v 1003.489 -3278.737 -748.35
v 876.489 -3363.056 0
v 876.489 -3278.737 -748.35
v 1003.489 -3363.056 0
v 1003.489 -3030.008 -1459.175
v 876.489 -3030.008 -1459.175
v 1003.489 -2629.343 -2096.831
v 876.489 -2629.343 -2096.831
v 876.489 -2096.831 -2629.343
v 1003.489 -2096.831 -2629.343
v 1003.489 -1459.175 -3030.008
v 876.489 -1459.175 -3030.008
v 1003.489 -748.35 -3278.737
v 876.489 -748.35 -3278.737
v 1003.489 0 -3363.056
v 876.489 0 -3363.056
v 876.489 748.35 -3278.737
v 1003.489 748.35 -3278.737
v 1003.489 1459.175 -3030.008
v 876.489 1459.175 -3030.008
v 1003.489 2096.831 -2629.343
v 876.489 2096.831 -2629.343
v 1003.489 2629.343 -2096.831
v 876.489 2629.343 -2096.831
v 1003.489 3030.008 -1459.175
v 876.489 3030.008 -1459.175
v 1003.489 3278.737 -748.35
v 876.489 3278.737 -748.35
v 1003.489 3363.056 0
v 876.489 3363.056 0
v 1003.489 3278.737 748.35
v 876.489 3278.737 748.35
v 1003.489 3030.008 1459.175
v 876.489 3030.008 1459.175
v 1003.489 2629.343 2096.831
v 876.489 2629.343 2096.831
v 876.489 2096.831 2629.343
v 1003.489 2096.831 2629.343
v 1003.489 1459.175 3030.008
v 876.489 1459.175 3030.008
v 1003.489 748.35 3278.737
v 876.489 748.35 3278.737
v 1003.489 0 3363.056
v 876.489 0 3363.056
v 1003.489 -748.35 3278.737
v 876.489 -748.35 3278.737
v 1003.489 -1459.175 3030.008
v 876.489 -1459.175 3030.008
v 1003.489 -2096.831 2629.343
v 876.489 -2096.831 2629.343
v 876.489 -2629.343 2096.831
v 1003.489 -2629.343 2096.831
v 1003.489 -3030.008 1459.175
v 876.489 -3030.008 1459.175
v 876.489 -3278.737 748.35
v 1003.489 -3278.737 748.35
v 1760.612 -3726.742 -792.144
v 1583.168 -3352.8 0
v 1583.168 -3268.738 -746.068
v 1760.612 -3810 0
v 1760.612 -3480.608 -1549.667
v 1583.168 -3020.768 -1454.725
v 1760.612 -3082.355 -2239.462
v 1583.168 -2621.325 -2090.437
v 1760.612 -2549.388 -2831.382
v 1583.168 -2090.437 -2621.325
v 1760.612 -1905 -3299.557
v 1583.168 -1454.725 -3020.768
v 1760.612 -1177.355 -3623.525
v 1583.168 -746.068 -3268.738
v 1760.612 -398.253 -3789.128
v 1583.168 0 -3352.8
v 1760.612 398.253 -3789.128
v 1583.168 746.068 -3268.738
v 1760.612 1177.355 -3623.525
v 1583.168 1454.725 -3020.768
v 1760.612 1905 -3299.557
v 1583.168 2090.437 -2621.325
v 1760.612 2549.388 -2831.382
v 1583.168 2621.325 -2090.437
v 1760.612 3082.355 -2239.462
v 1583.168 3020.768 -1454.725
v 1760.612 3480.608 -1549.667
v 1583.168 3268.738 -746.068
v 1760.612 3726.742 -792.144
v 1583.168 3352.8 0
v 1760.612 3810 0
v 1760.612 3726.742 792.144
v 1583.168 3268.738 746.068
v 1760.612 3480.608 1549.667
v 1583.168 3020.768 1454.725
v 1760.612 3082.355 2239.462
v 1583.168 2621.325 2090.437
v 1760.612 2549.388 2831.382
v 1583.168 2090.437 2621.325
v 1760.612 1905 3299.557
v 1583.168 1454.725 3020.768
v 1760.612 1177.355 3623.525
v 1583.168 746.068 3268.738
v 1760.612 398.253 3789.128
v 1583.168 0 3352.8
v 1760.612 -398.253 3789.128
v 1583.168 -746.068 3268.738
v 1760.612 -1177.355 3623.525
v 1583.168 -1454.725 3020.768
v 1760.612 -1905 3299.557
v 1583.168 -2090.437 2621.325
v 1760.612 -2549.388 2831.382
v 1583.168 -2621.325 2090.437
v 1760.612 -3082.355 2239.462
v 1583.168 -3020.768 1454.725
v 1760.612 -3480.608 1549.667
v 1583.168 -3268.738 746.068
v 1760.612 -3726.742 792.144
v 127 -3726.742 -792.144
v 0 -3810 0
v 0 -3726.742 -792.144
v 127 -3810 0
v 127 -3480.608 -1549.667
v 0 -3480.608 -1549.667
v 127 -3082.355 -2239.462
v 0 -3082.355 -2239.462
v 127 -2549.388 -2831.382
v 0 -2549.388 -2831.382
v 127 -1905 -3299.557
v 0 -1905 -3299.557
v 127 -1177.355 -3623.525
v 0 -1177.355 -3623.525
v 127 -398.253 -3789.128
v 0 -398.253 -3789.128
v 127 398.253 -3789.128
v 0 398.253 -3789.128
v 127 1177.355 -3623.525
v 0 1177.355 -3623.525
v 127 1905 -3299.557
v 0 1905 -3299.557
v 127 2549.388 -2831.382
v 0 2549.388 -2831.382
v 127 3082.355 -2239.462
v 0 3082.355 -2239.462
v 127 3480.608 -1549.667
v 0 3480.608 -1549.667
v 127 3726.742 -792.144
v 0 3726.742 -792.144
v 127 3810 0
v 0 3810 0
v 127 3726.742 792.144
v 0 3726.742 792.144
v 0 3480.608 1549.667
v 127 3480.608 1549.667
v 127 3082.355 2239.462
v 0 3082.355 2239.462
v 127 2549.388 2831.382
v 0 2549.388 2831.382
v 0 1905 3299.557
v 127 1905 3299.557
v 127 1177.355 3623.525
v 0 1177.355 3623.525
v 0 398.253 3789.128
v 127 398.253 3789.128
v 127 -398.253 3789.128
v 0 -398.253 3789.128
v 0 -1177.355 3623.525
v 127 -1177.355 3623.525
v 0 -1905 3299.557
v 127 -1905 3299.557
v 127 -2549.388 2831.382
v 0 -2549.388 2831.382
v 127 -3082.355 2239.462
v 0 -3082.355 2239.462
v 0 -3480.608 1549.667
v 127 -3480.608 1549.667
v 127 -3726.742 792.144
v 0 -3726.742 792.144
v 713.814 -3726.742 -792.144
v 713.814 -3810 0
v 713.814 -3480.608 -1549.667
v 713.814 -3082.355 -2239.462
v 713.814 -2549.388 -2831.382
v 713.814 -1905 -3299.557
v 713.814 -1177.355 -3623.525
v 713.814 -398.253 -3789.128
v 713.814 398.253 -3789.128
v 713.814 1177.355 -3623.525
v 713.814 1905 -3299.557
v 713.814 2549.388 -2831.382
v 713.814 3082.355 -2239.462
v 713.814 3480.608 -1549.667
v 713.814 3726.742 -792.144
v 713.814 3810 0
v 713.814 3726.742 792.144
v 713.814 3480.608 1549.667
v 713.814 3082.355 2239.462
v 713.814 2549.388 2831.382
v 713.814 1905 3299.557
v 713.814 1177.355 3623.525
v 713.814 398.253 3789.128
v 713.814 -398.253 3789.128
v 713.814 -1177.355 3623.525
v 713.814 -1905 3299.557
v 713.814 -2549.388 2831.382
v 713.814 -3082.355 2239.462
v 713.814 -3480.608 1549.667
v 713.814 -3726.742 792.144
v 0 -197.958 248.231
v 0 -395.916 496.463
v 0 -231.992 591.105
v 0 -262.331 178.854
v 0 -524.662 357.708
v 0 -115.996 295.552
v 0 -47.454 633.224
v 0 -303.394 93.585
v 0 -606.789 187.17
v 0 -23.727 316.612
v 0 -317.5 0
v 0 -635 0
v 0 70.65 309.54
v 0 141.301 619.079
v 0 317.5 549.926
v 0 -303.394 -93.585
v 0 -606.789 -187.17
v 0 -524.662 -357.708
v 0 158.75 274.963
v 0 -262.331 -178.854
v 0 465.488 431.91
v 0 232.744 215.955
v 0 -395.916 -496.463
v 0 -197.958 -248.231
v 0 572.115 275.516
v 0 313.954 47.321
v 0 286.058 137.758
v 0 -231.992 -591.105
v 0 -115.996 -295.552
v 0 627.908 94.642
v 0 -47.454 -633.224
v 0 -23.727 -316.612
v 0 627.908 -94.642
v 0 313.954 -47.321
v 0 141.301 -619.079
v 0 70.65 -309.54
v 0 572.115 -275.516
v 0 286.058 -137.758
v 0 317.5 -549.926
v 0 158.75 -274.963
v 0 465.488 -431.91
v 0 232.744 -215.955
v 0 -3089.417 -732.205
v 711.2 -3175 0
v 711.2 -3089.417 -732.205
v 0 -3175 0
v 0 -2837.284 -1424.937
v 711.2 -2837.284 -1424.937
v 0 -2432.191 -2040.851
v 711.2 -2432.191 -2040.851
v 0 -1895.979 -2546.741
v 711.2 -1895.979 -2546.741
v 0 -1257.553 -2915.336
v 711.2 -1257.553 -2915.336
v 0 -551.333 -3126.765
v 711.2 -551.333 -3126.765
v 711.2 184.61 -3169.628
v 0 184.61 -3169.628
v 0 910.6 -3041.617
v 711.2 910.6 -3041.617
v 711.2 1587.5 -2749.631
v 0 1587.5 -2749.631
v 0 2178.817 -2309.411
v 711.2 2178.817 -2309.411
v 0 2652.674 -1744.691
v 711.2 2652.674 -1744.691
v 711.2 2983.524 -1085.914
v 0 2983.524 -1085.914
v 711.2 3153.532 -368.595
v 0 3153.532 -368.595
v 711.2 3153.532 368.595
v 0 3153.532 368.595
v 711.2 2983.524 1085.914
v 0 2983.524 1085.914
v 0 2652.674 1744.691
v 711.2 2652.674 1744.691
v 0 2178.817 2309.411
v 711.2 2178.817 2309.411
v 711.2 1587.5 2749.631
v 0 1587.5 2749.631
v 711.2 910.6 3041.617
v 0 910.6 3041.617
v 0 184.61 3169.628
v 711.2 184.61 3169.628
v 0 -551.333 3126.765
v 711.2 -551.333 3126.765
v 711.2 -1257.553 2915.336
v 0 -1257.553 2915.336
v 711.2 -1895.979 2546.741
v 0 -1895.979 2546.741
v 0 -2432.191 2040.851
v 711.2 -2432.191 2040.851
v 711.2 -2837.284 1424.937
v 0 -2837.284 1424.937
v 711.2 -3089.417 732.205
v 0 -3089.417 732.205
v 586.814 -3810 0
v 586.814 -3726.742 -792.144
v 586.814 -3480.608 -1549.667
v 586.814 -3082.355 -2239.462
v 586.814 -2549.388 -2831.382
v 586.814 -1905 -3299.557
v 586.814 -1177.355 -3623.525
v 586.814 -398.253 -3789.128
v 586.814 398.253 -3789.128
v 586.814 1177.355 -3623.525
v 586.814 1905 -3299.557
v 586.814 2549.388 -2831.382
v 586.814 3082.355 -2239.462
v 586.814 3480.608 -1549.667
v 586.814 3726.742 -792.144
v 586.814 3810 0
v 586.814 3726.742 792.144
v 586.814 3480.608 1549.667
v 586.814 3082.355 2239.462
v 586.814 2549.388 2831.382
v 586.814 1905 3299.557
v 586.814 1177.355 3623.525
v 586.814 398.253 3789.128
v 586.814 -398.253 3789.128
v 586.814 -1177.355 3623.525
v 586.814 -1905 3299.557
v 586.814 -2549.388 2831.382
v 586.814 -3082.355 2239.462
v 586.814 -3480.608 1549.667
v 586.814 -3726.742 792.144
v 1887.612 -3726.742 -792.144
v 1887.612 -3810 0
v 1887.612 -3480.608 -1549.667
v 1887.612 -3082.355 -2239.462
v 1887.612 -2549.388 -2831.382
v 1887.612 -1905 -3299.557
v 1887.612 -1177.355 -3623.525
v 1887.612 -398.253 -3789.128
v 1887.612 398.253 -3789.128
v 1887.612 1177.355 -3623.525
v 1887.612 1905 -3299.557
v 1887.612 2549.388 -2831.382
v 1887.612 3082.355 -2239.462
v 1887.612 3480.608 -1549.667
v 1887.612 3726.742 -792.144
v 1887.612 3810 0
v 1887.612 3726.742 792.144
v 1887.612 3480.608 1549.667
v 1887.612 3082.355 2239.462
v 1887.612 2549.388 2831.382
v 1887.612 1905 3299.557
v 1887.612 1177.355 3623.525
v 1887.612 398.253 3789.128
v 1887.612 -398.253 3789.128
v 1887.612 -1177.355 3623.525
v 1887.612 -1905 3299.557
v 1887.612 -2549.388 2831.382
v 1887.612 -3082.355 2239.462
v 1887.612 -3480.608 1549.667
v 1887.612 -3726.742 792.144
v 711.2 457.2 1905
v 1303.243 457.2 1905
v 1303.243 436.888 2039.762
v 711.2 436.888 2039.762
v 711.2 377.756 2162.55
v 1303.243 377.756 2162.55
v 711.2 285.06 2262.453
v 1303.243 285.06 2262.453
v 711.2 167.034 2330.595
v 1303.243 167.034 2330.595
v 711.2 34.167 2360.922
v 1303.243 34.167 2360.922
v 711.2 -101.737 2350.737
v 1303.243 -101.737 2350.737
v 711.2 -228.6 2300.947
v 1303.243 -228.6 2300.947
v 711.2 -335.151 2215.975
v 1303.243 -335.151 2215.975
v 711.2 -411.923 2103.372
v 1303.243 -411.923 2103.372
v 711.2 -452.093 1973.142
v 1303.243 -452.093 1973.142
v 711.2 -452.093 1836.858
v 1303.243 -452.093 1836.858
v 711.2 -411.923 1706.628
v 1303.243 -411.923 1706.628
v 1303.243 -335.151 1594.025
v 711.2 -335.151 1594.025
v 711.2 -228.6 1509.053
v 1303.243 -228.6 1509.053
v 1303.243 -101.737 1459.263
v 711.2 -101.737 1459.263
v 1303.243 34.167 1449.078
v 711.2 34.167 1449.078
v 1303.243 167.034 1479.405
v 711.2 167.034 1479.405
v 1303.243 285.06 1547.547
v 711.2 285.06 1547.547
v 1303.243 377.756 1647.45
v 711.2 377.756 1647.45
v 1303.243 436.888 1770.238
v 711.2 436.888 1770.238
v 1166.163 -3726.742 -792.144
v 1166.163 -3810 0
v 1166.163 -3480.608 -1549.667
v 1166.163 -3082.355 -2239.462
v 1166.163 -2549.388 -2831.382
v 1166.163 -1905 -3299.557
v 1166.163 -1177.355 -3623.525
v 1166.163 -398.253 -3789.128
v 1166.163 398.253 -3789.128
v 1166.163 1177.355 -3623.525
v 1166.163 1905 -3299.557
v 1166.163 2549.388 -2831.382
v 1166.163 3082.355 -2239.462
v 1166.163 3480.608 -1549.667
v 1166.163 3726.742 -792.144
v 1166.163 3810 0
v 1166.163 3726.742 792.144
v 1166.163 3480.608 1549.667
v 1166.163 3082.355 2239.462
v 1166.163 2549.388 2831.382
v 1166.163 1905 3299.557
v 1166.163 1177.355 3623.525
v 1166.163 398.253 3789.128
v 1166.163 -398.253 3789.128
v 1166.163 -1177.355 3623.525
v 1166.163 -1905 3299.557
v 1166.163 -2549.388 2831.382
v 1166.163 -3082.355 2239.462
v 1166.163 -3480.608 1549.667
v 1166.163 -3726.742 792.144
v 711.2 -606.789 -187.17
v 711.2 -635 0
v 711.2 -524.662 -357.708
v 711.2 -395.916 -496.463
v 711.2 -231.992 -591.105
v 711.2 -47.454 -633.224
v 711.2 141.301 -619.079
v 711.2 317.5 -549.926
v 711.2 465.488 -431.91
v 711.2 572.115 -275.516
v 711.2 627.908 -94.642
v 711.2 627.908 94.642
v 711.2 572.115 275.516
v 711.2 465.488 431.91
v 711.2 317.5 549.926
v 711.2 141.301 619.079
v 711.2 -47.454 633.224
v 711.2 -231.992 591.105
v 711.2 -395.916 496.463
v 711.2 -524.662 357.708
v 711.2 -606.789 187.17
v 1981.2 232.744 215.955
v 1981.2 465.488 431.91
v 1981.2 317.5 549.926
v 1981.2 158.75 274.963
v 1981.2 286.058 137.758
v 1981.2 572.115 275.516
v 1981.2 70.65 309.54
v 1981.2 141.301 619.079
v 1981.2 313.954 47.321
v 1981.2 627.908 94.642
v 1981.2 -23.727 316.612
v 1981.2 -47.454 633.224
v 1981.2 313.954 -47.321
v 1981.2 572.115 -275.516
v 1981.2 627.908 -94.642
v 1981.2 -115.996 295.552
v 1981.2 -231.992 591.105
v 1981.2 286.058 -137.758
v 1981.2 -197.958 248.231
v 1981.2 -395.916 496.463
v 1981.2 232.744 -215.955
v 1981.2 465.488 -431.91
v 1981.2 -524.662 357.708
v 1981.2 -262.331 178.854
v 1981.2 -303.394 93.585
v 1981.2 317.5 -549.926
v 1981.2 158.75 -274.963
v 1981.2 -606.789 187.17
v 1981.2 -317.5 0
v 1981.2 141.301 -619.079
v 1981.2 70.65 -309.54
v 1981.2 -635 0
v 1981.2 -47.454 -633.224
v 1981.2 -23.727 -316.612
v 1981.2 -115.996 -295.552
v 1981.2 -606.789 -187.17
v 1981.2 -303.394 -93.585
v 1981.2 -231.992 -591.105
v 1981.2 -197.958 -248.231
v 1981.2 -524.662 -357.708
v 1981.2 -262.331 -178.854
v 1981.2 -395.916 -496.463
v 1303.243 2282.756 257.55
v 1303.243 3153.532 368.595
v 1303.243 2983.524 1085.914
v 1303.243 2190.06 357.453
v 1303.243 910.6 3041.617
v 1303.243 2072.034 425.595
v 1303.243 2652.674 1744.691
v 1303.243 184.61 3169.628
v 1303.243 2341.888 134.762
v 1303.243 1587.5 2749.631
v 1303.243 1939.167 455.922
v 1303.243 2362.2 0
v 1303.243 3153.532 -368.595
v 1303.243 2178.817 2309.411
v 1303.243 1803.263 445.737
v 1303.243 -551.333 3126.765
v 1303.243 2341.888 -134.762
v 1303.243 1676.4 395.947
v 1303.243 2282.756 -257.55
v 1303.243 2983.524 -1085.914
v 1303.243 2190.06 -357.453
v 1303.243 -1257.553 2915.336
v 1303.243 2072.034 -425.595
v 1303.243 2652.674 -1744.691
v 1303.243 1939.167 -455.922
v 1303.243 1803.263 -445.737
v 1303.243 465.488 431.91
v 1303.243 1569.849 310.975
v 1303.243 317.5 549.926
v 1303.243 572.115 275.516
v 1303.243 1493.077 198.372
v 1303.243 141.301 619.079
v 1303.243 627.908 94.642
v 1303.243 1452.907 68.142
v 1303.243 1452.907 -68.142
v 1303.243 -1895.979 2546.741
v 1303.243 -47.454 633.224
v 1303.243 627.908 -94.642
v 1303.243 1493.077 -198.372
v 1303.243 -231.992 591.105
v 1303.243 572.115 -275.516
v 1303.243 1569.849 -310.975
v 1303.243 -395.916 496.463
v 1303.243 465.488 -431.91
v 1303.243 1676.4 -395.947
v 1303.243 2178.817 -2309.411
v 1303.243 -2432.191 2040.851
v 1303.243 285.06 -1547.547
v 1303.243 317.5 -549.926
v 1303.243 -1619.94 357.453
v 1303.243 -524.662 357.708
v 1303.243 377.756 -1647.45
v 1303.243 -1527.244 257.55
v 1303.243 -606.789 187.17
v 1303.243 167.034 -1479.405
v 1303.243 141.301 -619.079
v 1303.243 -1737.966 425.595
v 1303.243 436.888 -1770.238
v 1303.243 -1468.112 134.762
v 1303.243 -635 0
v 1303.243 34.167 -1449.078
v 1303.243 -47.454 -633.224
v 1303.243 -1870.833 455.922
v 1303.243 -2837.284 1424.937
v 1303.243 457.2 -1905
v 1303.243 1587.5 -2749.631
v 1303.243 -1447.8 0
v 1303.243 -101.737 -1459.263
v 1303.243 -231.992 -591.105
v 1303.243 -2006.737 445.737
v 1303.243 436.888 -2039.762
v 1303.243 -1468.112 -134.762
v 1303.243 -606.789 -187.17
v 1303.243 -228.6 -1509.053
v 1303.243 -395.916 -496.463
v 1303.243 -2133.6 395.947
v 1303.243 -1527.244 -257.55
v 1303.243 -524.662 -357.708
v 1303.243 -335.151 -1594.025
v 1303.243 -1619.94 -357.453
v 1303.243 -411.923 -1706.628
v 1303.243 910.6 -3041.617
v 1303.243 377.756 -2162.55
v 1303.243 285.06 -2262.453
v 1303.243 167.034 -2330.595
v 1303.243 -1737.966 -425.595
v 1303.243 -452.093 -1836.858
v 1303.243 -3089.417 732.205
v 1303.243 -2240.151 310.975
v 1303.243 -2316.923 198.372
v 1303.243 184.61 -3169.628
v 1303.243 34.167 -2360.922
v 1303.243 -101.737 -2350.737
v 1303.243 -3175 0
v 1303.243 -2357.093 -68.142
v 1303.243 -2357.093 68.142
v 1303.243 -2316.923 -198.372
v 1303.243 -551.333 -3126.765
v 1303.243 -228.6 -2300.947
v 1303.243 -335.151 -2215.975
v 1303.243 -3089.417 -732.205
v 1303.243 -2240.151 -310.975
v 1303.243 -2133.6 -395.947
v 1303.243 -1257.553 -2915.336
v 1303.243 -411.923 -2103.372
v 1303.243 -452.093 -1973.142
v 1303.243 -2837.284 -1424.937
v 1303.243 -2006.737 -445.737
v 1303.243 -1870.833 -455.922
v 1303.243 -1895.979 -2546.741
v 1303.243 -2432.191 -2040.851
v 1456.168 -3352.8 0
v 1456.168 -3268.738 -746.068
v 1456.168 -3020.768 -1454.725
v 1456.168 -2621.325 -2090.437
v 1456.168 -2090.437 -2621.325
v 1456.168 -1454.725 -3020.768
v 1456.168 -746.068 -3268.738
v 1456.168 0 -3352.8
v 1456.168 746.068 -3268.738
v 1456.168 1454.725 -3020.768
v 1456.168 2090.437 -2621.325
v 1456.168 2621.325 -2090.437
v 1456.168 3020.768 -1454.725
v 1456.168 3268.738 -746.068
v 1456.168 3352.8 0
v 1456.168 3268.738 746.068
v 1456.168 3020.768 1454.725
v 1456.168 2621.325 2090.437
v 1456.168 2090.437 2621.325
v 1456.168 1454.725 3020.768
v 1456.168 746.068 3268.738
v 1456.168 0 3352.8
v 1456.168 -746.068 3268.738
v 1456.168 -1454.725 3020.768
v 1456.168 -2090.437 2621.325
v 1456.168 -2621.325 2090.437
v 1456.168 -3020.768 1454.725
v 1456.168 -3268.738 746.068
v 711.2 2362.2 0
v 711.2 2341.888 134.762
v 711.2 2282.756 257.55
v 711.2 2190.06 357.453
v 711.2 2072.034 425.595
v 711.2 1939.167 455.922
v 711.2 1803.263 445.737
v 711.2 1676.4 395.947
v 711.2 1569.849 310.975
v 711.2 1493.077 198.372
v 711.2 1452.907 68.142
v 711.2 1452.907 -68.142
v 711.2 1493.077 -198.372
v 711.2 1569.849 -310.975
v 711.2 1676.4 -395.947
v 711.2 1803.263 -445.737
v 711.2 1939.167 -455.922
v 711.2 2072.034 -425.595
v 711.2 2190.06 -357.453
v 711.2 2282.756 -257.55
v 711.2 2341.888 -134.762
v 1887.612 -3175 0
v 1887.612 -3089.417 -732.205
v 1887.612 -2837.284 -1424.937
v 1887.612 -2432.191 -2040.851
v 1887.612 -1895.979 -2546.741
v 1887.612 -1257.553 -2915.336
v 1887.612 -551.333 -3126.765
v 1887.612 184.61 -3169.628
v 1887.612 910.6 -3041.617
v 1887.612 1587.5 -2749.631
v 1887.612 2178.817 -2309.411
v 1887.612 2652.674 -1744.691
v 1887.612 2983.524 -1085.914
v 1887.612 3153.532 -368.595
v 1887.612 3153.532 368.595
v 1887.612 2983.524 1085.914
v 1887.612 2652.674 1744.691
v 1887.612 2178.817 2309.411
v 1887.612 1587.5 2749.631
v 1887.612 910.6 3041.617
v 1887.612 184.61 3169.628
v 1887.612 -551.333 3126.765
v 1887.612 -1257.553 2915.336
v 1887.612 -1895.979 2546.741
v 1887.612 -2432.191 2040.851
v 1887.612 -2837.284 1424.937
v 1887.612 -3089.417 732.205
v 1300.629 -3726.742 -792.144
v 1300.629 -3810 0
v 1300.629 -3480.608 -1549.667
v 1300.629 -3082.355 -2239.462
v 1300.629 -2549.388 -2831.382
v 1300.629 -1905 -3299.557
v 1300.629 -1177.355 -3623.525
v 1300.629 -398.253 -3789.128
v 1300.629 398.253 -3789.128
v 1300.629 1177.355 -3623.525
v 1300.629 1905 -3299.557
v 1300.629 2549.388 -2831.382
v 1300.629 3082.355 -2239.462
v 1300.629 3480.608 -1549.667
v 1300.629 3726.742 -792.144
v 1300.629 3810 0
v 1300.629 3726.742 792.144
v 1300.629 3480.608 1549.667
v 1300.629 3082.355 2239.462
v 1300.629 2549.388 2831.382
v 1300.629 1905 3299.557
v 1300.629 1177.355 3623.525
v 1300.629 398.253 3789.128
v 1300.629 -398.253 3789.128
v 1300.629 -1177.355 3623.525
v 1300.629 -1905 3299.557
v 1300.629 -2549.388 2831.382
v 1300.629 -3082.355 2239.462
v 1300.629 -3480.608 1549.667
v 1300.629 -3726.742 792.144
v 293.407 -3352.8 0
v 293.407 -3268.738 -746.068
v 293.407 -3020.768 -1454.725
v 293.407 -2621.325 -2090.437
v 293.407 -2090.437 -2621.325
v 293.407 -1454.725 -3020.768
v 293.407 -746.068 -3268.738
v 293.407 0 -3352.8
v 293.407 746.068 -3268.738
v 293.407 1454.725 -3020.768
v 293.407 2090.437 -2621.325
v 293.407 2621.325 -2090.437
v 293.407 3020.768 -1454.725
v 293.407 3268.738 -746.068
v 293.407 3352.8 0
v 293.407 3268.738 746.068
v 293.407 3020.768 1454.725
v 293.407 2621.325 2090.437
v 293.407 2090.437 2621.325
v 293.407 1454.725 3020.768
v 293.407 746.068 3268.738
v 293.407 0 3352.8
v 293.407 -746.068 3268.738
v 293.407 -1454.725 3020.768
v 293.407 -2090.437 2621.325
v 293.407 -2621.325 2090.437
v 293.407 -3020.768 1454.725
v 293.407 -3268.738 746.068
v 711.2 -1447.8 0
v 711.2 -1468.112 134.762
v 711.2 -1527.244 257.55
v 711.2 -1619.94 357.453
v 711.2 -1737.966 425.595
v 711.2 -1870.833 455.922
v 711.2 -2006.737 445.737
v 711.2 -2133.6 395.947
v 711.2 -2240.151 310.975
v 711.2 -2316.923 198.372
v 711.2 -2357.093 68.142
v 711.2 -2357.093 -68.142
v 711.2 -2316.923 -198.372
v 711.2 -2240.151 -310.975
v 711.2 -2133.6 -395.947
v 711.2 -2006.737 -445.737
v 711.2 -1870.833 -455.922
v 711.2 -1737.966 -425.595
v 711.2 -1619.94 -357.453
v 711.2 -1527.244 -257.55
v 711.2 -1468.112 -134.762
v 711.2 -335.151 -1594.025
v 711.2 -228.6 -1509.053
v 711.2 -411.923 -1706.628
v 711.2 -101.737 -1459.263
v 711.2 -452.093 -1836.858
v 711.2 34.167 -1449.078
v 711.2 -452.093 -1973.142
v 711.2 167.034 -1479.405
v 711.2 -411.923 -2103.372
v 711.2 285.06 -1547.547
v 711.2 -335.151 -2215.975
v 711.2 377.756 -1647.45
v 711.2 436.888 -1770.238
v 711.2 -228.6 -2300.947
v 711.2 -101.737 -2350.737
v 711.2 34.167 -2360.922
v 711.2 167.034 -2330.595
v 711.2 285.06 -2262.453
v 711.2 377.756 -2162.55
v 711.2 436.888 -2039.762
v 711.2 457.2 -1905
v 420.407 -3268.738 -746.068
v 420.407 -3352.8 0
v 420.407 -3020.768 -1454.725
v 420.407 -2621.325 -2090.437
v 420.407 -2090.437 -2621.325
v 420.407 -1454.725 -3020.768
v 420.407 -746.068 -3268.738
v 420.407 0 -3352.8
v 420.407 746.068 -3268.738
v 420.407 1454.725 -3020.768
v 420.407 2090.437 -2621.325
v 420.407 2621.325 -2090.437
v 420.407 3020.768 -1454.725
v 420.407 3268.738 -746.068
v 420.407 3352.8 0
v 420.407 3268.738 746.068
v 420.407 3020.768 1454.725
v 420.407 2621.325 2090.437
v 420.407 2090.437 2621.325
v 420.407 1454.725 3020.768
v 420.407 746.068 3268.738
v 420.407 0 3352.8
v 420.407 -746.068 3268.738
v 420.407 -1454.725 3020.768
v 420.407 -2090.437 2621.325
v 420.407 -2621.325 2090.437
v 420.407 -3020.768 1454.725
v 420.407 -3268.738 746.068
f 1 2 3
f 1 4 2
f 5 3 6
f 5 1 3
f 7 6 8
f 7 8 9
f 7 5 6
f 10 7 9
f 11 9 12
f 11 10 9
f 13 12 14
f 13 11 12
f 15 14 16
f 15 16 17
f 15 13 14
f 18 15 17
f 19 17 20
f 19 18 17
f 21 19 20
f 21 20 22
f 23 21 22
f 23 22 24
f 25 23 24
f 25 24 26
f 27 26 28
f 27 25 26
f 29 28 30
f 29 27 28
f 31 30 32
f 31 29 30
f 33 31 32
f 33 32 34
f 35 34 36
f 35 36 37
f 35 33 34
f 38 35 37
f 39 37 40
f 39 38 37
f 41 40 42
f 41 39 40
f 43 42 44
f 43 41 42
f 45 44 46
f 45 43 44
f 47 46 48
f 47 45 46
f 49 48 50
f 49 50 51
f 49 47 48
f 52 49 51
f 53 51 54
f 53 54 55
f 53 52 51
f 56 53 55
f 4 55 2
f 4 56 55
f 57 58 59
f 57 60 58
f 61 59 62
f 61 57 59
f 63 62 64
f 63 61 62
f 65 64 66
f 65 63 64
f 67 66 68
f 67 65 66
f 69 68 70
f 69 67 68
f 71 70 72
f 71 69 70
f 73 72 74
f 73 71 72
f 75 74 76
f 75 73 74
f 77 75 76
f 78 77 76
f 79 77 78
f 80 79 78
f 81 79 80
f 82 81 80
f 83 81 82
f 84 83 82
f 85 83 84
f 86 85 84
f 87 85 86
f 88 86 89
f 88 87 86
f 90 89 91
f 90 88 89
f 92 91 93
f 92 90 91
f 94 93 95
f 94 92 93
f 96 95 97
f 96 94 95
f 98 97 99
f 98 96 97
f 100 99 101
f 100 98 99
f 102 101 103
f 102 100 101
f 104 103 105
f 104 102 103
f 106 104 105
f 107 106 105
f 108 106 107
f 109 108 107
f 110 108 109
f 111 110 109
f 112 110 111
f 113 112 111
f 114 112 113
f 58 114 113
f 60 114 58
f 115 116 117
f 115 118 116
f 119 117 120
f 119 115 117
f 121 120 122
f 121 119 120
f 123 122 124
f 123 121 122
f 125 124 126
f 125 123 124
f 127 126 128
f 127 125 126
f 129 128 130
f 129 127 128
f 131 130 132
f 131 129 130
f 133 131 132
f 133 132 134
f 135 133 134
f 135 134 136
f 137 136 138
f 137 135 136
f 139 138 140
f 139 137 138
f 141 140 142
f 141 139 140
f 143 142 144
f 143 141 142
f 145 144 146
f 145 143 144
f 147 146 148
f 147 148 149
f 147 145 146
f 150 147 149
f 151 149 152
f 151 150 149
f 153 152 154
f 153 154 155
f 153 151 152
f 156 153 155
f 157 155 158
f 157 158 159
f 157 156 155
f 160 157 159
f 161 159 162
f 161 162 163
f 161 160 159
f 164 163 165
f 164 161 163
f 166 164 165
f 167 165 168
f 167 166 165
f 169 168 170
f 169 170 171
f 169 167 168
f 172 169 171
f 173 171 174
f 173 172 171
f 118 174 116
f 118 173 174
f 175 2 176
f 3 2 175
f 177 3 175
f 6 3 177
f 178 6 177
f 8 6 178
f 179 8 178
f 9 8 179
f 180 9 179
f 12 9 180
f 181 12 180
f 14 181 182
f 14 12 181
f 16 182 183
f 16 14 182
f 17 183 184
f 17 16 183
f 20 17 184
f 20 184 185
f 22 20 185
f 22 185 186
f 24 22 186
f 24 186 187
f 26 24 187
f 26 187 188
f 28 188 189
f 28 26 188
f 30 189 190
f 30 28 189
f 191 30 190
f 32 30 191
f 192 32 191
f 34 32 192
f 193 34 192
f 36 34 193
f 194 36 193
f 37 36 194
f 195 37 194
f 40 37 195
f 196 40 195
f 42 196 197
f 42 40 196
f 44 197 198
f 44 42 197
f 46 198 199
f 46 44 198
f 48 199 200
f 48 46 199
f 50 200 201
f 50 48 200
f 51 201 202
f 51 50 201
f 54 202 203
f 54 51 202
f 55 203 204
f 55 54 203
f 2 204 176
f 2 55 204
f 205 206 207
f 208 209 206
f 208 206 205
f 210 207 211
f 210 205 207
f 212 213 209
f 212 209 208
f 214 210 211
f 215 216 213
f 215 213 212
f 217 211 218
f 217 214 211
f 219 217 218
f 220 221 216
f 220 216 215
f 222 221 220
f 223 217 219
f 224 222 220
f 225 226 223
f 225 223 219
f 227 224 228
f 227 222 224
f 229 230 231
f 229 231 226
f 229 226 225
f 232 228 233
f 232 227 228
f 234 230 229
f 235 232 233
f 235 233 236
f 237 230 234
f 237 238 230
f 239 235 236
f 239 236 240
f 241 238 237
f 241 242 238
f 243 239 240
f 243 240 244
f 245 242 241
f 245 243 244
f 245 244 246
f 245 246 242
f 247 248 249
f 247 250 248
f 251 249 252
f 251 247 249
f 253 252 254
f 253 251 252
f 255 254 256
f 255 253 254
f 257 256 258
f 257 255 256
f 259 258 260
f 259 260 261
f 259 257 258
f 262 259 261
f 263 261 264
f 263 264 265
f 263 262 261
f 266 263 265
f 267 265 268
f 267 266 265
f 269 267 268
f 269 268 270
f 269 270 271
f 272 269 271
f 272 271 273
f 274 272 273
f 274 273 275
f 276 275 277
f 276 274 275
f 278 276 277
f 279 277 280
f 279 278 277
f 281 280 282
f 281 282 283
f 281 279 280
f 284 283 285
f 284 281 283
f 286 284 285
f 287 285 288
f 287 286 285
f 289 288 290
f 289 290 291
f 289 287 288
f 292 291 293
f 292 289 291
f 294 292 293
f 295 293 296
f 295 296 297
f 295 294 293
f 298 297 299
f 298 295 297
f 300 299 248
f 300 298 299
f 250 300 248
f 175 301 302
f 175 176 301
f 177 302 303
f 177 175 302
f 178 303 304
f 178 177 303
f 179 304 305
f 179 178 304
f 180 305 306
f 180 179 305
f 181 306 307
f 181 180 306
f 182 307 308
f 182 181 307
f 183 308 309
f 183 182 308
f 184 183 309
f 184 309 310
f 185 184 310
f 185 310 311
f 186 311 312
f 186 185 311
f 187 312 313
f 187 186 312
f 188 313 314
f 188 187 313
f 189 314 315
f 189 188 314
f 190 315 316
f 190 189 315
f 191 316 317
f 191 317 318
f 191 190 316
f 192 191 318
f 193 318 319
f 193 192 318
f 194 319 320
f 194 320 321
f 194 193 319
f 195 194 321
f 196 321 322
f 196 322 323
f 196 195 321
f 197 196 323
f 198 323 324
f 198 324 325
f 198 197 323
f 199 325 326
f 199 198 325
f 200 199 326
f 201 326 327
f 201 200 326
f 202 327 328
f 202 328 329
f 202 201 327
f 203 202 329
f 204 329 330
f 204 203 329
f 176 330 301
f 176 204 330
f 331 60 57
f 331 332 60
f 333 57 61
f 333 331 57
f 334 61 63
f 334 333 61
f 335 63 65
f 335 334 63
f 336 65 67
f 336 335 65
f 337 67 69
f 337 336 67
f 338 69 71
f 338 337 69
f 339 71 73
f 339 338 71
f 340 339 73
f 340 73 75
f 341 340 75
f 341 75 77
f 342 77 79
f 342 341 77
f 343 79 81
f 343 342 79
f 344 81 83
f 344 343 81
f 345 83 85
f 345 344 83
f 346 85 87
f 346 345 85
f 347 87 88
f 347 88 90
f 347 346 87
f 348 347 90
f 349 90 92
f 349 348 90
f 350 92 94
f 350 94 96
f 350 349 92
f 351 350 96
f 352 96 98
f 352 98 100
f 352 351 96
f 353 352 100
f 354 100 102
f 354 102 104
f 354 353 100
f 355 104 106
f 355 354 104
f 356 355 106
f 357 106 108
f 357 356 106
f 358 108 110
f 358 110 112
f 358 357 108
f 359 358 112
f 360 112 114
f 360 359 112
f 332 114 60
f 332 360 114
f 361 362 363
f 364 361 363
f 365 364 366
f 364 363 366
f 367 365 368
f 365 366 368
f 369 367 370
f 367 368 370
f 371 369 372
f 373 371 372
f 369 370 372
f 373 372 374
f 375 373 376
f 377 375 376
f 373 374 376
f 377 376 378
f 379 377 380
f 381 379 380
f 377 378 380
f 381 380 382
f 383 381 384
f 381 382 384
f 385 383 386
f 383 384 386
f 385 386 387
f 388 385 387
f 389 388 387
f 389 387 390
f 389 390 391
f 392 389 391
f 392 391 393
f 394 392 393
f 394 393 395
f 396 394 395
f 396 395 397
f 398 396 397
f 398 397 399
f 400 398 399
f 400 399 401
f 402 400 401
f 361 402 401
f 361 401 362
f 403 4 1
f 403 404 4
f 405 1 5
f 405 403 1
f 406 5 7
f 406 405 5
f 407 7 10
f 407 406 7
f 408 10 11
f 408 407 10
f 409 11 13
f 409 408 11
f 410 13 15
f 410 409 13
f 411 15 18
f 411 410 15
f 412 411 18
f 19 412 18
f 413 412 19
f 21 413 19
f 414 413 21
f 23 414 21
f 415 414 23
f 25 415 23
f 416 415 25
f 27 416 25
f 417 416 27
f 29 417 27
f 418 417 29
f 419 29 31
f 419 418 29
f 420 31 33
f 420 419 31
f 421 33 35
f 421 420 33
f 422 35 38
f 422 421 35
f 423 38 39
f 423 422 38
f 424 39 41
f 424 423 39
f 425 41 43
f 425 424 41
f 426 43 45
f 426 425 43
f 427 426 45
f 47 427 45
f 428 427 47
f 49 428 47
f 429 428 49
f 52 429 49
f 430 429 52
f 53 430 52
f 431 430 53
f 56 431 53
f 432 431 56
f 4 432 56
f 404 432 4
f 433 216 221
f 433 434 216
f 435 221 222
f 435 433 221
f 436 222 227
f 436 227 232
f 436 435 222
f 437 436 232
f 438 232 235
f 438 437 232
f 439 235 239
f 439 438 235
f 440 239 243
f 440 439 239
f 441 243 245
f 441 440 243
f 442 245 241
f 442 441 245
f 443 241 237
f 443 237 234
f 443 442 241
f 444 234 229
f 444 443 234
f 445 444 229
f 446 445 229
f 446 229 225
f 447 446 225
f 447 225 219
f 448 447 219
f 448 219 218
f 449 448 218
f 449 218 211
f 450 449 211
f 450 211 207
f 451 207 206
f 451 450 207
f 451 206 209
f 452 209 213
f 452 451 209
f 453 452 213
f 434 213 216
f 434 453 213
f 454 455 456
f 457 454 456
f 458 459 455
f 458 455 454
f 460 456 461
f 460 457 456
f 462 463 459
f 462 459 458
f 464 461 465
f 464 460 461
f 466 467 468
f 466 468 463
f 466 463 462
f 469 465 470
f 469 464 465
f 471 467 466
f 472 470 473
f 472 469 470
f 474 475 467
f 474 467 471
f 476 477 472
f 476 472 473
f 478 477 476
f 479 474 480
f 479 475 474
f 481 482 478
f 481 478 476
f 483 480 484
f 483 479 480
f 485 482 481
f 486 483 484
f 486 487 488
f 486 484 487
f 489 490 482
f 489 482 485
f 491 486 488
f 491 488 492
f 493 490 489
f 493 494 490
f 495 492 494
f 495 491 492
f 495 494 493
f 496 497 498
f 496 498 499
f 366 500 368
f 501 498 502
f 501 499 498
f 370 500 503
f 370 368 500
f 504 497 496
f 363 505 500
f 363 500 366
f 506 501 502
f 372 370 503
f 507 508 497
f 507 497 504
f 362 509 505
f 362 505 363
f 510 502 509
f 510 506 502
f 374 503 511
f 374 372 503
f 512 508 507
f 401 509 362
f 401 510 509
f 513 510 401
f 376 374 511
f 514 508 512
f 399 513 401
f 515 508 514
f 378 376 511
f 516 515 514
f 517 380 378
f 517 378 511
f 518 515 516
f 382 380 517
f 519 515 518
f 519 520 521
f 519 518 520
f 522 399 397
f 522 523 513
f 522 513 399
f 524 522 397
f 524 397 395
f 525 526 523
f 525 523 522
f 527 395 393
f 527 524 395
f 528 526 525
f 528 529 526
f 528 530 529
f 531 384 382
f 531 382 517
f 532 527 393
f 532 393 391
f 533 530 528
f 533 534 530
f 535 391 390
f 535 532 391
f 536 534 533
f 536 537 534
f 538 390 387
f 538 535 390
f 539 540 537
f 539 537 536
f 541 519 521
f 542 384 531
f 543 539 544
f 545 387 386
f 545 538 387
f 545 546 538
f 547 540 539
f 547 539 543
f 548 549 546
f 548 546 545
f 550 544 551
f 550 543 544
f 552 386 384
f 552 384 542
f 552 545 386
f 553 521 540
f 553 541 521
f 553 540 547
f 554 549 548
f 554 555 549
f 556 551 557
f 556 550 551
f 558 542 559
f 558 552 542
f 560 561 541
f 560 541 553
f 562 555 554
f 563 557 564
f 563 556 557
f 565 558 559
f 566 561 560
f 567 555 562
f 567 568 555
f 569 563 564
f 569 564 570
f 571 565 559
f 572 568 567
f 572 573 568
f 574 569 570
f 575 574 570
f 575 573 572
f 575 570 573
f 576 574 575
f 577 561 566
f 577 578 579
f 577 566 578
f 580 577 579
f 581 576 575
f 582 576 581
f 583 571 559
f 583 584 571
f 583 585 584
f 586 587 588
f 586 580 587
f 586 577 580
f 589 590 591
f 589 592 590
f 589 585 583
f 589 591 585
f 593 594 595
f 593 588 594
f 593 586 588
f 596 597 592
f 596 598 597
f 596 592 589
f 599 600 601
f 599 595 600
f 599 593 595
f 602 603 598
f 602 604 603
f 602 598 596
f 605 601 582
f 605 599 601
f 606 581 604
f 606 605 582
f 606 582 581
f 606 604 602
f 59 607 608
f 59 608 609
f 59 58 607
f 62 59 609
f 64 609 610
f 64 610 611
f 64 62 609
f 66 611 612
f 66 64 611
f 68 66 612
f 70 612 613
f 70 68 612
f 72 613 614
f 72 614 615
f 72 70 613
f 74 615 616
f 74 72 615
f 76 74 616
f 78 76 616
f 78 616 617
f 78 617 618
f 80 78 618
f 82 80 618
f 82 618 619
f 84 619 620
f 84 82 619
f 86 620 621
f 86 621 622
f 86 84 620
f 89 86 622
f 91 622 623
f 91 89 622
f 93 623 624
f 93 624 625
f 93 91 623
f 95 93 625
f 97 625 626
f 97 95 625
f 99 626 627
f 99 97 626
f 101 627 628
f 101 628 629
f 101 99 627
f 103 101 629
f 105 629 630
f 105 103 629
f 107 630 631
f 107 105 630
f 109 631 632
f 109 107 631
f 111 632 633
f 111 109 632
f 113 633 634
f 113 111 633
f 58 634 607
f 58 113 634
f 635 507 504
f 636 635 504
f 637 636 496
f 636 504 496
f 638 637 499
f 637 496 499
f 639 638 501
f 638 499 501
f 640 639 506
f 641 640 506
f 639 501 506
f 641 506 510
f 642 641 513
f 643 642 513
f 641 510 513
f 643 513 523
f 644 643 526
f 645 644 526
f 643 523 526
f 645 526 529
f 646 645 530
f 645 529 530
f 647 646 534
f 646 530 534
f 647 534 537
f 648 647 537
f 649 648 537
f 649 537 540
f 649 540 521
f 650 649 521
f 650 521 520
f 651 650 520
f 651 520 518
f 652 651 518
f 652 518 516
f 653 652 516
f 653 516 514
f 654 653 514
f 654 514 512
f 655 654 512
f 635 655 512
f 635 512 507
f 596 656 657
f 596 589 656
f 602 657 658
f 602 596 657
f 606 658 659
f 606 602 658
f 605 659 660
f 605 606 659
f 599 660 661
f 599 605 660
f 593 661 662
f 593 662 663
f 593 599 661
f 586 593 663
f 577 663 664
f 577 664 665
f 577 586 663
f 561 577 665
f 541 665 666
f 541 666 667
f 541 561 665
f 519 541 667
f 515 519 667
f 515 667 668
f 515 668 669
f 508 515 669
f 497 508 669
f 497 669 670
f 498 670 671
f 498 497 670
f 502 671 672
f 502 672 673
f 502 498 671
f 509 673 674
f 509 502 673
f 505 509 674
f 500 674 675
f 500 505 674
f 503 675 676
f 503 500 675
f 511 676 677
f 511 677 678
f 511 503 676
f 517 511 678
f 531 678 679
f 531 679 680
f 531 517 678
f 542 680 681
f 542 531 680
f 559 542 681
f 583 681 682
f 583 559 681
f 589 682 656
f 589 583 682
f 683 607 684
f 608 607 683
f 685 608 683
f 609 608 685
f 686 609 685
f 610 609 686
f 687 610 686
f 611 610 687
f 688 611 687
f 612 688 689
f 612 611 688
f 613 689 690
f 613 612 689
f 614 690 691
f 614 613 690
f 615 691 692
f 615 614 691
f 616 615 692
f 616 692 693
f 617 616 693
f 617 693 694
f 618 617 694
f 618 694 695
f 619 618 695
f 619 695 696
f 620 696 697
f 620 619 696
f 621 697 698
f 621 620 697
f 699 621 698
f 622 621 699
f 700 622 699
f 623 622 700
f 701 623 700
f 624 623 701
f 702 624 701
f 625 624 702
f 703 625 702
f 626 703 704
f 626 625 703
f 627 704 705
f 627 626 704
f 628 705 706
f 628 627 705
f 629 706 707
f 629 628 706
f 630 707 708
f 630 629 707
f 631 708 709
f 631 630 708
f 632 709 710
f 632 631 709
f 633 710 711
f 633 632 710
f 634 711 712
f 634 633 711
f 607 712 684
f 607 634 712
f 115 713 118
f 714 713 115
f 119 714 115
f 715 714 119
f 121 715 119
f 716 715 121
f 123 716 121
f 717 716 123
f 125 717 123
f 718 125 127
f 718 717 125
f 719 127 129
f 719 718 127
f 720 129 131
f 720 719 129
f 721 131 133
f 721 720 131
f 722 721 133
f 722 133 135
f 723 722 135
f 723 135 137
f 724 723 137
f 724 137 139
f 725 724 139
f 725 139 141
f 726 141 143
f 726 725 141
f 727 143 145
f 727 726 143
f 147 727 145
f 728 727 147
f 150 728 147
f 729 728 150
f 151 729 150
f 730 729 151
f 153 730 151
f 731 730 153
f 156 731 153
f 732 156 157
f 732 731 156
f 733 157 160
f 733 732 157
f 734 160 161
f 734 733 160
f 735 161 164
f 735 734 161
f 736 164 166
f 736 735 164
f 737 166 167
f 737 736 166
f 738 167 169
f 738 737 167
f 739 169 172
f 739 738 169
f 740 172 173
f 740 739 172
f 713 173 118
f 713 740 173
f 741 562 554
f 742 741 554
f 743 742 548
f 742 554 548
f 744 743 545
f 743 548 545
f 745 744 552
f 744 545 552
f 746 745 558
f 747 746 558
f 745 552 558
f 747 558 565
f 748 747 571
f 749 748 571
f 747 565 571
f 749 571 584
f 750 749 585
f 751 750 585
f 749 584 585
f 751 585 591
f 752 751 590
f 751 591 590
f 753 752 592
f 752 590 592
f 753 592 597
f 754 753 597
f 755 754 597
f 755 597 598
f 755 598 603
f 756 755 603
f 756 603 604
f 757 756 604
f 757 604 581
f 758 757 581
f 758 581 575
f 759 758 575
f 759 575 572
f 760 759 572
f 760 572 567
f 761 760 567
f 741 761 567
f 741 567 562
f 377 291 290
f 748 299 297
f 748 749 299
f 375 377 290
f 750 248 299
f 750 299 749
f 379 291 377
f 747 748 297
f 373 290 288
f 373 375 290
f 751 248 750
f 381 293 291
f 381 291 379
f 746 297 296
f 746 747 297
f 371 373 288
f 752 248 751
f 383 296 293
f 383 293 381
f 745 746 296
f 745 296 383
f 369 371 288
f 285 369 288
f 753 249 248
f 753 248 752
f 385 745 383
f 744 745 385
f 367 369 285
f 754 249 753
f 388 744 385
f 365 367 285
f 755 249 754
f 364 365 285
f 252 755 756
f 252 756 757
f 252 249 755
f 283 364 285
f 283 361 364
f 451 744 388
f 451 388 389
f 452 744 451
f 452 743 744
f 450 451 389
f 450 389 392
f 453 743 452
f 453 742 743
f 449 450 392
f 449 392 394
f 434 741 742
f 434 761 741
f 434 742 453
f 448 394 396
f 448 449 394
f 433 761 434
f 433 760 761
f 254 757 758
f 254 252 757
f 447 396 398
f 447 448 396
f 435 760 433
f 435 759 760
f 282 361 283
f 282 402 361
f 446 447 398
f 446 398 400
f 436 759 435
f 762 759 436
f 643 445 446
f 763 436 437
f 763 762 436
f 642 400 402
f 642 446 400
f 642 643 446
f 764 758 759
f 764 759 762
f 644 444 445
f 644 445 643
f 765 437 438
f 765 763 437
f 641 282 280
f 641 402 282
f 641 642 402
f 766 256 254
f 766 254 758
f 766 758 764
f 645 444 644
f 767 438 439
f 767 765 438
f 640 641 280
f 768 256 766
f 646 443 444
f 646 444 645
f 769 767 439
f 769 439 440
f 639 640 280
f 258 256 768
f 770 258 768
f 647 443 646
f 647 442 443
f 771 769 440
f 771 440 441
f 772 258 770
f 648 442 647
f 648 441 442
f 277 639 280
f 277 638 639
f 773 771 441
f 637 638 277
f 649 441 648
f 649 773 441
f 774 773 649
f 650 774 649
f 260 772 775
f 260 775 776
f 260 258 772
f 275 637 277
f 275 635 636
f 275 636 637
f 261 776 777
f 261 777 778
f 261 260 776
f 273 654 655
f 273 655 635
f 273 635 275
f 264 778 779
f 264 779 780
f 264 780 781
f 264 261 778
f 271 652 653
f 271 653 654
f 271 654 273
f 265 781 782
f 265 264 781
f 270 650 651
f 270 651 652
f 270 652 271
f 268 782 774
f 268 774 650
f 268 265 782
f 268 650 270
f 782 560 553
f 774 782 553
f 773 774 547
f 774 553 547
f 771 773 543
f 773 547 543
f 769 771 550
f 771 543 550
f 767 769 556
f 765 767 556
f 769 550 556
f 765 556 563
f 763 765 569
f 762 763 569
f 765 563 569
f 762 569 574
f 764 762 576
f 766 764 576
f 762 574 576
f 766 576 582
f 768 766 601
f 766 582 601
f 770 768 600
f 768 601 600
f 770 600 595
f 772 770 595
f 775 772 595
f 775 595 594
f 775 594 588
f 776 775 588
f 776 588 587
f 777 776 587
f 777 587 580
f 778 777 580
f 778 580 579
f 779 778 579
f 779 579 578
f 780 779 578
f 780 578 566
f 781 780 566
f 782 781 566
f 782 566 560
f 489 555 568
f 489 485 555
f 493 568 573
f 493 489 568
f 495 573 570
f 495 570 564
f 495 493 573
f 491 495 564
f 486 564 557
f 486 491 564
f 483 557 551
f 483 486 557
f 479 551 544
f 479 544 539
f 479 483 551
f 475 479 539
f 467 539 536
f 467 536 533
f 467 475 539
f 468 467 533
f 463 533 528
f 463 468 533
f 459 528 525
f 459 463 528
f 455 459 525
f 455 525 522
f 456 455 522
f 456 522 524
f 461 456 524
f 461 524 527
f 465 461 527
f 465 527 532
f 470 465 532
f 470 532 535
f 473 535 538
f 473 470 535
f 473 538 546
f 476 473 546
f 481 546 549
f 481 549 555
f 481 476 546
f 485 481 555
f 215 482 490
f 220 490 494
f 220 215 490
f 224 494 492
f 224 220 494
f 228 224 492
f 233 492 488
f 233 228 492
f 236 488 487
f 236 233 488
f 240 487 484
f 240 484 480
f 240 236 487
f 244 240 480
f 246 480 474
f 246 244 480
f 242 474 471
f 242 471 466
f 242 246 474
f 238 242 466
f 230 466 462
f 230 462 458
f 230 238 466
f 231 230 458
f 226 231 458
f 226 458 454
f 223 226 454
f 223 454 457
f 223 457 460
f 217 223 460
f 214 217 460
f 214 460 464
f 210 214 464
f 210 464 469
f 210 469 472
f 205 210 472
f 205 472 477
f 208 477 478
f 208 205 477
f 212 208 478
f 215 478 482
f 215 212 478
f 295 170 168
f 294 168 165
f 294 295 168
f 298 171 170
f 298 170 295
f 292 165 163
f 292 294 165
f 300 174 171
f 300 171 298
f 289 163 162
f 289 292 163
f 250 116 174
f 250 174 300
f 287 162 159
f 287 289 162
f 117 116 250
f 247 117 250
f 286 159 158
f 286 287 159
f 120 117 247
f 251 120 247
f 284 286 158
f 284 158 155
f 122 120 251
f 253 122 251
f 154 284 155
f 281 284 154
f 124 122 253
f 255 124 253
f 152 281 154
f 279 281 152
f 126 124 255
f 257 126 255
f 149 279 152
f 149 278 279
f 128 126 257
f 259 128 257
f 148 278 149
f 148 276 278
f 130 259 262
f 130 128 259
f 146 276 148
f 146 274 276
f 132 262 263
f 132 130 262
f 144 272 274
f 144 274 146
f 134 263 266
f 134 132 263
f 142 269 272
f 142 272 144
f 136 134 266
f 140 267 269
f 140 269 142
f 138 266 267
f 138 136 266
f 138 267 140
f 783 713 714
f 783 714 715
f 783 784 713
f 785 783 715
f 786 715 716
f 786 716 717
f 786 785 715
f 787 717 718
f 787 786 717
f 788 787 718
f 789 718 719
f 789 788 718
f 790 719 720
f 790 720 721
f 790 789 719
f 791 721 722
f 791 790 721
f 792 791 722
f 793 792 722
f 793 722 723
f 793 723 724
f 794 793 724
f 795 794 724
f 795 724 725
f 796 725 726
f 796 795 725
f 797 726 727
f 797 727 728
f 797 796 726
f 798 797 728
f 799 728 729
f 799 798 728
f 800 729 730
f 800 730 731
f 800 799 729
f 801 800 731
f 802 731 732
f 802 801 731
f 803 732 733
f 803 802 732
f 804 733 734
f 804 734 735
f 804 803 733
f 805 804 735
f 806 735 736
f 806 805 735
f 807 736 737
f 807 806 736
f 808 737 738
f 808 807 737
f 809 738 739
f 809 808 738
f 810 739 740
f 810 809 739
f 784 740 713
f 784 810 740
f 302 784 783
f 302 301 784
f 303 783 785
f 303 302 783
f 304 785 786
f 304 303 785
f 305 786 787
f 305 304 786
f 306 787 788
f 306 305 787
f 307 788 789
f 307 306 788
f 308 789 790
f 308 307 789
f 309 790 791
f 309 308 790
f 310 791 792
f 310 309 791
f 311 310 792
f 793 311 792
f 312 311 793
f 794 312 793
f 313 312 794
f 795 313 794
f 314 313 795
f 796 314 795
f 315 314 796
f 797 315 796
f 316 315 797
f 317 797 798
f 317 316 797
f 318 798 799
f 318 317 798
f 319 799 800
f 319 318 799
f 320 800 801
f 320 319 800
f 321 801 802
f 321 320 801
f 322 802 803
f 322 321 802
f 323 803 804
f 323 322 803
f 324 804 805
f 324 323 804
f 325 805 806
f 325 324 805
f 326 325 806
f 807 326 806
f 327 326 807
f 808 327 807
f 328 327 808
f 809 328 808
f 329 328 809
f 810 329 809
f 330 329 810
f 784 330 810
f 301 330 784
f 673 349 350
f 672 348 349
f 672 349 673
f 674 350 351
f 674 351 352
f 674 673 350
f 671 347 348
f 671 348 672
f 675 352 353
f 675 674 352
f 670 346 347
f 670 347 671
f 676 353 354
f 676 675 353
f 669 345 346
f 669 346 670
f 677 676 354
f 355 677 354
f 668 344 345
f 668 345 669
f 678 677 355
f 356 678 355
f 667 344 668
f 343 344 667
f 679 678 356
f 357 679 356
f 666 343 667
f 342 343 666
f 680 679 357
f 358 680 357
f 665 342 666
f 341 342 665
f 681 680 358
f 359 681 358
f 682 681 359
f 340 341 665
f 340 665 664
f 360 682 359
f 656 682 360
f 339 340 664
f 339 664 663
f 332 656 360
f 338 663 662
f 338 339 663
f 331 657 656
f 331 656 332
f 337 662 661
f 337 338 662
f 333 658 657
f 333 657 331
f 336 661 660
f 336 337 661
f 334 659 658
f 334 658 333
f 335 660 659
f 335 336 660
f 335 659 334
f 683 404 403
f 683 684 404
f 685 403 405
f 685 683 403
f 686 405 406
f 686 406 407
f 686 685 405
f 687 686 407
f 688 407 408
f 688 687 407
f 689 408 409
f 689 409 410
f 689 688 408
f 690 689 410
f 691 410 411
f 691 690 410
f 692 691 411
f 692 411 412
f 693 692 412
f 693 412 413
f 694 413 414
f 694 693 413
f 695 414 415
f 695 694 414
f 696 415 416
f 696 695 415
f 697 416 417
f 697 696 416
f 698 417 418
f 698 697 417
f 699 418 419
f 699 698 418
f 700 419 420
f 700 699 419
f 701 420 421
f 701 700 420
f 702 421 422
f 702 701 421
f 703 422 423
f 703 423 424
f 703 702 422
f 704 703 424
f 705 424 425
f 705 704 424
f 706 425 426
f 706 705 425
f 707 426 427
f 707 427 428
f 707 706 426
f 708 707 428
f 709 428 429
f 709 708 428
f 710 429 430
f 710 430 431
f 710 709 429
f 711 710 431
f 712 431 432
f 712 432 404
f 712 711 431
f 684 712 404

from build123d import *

# Parameters (mm, degrees)
CUT_EXTRUDE1_REACH = 5545.523
SKETCH2_R          = 457.2


with BuildPart() as part:
    # Sketch1 → Revolve1 (revolve)
    with BuildSketch(Plane.XY, mode=Mode.PRIVATE) as revolve1_sk:
        Polygon((0, 317.5), (0, 635), (711.2, 635), (711.2, 3175), (0, 3175), (0, 3810), (127, 3810), (293.407191107, 3352.8), (420.407191107, 3352.8), (586.814382213, 3810), (713.814382213, 3810), (876.488852113, 3363.055567228), (1003.488852113, 3363.055567228), (1166.163322013, 3810), (1300.628764426, 3810), (1456.167620866, 3352.8), (1583.167620866, 3352.8), (1760.611792053, 3810), (1887.611792053, 3810), (1887.611792053, 3175), (1303.243146639, 3175), (1303.243146639, 635), (1981.2, 635), (1981.2, 317.5), align=None)
    revolve(revolve1_sk.sketch.rotate(Axis((0, 0, 0), (1, 0, 0)), 180), axis=Axis((0, 0, 0), (1, 0, 0)))

    # Sketch2 → Cut-Extrude1 (cut, up to next)
    with BuildSketch(Plane(origin=(1303.243146639, 0, 0), x_dir=(0, 0, -1), z_dir=(1, 0, 0)), mode=Mode.PRIVATE) as cut_extrude1_sk1:
        with Locations(Location((0, 1905, 0), (0, 0, 90))):
            Circle(SKETCH2_R)
    cut_extrude1_tool1 = extrude(cut_extrude1_sk1.sketch, amount=-CUT_EXTRUDE1_REACH, mode=Mode.PRIVATE) & part.part
    # Sketch2 → Cut-Extrude1 (cut, up to next)
    with BuildSketch(Plane(origin=(1303.243146639, 0, 0), x_dir=(0, 0, -1), z_dir=(1, 0, 0)), mode=Mode.PRIVATE) as cut_extrude1_sk2:
        with Locations(Location((0, -1905, 0), (0, 0, 90))):
            Circle(SKETCH2_R)
    cut_extrude1_tool2 = extrude(cut_extrude1_sk2.sketch, amount=-CUT_EXTRUDE1_REACH, mode=Mode.PRIVATE) & part.part
    # Sketch2 → Cut-Extrude1 (cut, up to next)
    with BuildSketch(Plane(origin=(1303.243146639, 0, 0), x_dir=(0, 0, -1), z_dir=(1, 0, 0)), mode=Mode.PRIVATE) as cut_extrude1_sk3:
        with Locations(Location((1905, 0, 0), (0, 0, 90))):
            Circle(SKETCH2_R)
    cut_extrude1_tool3 = extrude(cut_extrude1_sk3.sketch, amount=-CUT_EXTRUDE1_REACH, mode=Mode.PRIVATE) & part.part
    # Sketch2 → Cut-Extrude1 (cut, up to next)
    with BuildSketch(Plane(origin=(1303.243146639, 0, 0), x_dir=(0, 0, -1), z_dir=(1, 0, 0)), mode=Mode.PRIVATE) as cut_extrude1_sk4:
        with Locations(Location((-1905, 0, 0), (0, 0, 90))):
            Circle(SKETCH2_R)
    cut_extrude1_tool4 = extrude(cut_extrude1_sk4.sketch, amount=-CUT_EXTRUDE1_REACH, mode=Mode.PRIVATE) & part.part
    add(cut_extrude1_tool1.solids().sort_by_distance((1303.243147, 1905, 0))[0], mode=Mode.SUBTRACT)
    add(cut_extrude1_tool2.solids().sort_by_distance((1303.243147, -1905, 0))[0], mode=Mode.SUBTRACT)
    add(cut_extrude1_tool3.solids().sort_by_distance((1303.243147, 0, -1905))[0], mode=Mode.SUBTRACT)
    add(cut_extrude1_tool4.solids().sort_by_distance((1303.243147, 0, 1905))[0], mode=Mode.SUBTRACT)


solid = part.part
